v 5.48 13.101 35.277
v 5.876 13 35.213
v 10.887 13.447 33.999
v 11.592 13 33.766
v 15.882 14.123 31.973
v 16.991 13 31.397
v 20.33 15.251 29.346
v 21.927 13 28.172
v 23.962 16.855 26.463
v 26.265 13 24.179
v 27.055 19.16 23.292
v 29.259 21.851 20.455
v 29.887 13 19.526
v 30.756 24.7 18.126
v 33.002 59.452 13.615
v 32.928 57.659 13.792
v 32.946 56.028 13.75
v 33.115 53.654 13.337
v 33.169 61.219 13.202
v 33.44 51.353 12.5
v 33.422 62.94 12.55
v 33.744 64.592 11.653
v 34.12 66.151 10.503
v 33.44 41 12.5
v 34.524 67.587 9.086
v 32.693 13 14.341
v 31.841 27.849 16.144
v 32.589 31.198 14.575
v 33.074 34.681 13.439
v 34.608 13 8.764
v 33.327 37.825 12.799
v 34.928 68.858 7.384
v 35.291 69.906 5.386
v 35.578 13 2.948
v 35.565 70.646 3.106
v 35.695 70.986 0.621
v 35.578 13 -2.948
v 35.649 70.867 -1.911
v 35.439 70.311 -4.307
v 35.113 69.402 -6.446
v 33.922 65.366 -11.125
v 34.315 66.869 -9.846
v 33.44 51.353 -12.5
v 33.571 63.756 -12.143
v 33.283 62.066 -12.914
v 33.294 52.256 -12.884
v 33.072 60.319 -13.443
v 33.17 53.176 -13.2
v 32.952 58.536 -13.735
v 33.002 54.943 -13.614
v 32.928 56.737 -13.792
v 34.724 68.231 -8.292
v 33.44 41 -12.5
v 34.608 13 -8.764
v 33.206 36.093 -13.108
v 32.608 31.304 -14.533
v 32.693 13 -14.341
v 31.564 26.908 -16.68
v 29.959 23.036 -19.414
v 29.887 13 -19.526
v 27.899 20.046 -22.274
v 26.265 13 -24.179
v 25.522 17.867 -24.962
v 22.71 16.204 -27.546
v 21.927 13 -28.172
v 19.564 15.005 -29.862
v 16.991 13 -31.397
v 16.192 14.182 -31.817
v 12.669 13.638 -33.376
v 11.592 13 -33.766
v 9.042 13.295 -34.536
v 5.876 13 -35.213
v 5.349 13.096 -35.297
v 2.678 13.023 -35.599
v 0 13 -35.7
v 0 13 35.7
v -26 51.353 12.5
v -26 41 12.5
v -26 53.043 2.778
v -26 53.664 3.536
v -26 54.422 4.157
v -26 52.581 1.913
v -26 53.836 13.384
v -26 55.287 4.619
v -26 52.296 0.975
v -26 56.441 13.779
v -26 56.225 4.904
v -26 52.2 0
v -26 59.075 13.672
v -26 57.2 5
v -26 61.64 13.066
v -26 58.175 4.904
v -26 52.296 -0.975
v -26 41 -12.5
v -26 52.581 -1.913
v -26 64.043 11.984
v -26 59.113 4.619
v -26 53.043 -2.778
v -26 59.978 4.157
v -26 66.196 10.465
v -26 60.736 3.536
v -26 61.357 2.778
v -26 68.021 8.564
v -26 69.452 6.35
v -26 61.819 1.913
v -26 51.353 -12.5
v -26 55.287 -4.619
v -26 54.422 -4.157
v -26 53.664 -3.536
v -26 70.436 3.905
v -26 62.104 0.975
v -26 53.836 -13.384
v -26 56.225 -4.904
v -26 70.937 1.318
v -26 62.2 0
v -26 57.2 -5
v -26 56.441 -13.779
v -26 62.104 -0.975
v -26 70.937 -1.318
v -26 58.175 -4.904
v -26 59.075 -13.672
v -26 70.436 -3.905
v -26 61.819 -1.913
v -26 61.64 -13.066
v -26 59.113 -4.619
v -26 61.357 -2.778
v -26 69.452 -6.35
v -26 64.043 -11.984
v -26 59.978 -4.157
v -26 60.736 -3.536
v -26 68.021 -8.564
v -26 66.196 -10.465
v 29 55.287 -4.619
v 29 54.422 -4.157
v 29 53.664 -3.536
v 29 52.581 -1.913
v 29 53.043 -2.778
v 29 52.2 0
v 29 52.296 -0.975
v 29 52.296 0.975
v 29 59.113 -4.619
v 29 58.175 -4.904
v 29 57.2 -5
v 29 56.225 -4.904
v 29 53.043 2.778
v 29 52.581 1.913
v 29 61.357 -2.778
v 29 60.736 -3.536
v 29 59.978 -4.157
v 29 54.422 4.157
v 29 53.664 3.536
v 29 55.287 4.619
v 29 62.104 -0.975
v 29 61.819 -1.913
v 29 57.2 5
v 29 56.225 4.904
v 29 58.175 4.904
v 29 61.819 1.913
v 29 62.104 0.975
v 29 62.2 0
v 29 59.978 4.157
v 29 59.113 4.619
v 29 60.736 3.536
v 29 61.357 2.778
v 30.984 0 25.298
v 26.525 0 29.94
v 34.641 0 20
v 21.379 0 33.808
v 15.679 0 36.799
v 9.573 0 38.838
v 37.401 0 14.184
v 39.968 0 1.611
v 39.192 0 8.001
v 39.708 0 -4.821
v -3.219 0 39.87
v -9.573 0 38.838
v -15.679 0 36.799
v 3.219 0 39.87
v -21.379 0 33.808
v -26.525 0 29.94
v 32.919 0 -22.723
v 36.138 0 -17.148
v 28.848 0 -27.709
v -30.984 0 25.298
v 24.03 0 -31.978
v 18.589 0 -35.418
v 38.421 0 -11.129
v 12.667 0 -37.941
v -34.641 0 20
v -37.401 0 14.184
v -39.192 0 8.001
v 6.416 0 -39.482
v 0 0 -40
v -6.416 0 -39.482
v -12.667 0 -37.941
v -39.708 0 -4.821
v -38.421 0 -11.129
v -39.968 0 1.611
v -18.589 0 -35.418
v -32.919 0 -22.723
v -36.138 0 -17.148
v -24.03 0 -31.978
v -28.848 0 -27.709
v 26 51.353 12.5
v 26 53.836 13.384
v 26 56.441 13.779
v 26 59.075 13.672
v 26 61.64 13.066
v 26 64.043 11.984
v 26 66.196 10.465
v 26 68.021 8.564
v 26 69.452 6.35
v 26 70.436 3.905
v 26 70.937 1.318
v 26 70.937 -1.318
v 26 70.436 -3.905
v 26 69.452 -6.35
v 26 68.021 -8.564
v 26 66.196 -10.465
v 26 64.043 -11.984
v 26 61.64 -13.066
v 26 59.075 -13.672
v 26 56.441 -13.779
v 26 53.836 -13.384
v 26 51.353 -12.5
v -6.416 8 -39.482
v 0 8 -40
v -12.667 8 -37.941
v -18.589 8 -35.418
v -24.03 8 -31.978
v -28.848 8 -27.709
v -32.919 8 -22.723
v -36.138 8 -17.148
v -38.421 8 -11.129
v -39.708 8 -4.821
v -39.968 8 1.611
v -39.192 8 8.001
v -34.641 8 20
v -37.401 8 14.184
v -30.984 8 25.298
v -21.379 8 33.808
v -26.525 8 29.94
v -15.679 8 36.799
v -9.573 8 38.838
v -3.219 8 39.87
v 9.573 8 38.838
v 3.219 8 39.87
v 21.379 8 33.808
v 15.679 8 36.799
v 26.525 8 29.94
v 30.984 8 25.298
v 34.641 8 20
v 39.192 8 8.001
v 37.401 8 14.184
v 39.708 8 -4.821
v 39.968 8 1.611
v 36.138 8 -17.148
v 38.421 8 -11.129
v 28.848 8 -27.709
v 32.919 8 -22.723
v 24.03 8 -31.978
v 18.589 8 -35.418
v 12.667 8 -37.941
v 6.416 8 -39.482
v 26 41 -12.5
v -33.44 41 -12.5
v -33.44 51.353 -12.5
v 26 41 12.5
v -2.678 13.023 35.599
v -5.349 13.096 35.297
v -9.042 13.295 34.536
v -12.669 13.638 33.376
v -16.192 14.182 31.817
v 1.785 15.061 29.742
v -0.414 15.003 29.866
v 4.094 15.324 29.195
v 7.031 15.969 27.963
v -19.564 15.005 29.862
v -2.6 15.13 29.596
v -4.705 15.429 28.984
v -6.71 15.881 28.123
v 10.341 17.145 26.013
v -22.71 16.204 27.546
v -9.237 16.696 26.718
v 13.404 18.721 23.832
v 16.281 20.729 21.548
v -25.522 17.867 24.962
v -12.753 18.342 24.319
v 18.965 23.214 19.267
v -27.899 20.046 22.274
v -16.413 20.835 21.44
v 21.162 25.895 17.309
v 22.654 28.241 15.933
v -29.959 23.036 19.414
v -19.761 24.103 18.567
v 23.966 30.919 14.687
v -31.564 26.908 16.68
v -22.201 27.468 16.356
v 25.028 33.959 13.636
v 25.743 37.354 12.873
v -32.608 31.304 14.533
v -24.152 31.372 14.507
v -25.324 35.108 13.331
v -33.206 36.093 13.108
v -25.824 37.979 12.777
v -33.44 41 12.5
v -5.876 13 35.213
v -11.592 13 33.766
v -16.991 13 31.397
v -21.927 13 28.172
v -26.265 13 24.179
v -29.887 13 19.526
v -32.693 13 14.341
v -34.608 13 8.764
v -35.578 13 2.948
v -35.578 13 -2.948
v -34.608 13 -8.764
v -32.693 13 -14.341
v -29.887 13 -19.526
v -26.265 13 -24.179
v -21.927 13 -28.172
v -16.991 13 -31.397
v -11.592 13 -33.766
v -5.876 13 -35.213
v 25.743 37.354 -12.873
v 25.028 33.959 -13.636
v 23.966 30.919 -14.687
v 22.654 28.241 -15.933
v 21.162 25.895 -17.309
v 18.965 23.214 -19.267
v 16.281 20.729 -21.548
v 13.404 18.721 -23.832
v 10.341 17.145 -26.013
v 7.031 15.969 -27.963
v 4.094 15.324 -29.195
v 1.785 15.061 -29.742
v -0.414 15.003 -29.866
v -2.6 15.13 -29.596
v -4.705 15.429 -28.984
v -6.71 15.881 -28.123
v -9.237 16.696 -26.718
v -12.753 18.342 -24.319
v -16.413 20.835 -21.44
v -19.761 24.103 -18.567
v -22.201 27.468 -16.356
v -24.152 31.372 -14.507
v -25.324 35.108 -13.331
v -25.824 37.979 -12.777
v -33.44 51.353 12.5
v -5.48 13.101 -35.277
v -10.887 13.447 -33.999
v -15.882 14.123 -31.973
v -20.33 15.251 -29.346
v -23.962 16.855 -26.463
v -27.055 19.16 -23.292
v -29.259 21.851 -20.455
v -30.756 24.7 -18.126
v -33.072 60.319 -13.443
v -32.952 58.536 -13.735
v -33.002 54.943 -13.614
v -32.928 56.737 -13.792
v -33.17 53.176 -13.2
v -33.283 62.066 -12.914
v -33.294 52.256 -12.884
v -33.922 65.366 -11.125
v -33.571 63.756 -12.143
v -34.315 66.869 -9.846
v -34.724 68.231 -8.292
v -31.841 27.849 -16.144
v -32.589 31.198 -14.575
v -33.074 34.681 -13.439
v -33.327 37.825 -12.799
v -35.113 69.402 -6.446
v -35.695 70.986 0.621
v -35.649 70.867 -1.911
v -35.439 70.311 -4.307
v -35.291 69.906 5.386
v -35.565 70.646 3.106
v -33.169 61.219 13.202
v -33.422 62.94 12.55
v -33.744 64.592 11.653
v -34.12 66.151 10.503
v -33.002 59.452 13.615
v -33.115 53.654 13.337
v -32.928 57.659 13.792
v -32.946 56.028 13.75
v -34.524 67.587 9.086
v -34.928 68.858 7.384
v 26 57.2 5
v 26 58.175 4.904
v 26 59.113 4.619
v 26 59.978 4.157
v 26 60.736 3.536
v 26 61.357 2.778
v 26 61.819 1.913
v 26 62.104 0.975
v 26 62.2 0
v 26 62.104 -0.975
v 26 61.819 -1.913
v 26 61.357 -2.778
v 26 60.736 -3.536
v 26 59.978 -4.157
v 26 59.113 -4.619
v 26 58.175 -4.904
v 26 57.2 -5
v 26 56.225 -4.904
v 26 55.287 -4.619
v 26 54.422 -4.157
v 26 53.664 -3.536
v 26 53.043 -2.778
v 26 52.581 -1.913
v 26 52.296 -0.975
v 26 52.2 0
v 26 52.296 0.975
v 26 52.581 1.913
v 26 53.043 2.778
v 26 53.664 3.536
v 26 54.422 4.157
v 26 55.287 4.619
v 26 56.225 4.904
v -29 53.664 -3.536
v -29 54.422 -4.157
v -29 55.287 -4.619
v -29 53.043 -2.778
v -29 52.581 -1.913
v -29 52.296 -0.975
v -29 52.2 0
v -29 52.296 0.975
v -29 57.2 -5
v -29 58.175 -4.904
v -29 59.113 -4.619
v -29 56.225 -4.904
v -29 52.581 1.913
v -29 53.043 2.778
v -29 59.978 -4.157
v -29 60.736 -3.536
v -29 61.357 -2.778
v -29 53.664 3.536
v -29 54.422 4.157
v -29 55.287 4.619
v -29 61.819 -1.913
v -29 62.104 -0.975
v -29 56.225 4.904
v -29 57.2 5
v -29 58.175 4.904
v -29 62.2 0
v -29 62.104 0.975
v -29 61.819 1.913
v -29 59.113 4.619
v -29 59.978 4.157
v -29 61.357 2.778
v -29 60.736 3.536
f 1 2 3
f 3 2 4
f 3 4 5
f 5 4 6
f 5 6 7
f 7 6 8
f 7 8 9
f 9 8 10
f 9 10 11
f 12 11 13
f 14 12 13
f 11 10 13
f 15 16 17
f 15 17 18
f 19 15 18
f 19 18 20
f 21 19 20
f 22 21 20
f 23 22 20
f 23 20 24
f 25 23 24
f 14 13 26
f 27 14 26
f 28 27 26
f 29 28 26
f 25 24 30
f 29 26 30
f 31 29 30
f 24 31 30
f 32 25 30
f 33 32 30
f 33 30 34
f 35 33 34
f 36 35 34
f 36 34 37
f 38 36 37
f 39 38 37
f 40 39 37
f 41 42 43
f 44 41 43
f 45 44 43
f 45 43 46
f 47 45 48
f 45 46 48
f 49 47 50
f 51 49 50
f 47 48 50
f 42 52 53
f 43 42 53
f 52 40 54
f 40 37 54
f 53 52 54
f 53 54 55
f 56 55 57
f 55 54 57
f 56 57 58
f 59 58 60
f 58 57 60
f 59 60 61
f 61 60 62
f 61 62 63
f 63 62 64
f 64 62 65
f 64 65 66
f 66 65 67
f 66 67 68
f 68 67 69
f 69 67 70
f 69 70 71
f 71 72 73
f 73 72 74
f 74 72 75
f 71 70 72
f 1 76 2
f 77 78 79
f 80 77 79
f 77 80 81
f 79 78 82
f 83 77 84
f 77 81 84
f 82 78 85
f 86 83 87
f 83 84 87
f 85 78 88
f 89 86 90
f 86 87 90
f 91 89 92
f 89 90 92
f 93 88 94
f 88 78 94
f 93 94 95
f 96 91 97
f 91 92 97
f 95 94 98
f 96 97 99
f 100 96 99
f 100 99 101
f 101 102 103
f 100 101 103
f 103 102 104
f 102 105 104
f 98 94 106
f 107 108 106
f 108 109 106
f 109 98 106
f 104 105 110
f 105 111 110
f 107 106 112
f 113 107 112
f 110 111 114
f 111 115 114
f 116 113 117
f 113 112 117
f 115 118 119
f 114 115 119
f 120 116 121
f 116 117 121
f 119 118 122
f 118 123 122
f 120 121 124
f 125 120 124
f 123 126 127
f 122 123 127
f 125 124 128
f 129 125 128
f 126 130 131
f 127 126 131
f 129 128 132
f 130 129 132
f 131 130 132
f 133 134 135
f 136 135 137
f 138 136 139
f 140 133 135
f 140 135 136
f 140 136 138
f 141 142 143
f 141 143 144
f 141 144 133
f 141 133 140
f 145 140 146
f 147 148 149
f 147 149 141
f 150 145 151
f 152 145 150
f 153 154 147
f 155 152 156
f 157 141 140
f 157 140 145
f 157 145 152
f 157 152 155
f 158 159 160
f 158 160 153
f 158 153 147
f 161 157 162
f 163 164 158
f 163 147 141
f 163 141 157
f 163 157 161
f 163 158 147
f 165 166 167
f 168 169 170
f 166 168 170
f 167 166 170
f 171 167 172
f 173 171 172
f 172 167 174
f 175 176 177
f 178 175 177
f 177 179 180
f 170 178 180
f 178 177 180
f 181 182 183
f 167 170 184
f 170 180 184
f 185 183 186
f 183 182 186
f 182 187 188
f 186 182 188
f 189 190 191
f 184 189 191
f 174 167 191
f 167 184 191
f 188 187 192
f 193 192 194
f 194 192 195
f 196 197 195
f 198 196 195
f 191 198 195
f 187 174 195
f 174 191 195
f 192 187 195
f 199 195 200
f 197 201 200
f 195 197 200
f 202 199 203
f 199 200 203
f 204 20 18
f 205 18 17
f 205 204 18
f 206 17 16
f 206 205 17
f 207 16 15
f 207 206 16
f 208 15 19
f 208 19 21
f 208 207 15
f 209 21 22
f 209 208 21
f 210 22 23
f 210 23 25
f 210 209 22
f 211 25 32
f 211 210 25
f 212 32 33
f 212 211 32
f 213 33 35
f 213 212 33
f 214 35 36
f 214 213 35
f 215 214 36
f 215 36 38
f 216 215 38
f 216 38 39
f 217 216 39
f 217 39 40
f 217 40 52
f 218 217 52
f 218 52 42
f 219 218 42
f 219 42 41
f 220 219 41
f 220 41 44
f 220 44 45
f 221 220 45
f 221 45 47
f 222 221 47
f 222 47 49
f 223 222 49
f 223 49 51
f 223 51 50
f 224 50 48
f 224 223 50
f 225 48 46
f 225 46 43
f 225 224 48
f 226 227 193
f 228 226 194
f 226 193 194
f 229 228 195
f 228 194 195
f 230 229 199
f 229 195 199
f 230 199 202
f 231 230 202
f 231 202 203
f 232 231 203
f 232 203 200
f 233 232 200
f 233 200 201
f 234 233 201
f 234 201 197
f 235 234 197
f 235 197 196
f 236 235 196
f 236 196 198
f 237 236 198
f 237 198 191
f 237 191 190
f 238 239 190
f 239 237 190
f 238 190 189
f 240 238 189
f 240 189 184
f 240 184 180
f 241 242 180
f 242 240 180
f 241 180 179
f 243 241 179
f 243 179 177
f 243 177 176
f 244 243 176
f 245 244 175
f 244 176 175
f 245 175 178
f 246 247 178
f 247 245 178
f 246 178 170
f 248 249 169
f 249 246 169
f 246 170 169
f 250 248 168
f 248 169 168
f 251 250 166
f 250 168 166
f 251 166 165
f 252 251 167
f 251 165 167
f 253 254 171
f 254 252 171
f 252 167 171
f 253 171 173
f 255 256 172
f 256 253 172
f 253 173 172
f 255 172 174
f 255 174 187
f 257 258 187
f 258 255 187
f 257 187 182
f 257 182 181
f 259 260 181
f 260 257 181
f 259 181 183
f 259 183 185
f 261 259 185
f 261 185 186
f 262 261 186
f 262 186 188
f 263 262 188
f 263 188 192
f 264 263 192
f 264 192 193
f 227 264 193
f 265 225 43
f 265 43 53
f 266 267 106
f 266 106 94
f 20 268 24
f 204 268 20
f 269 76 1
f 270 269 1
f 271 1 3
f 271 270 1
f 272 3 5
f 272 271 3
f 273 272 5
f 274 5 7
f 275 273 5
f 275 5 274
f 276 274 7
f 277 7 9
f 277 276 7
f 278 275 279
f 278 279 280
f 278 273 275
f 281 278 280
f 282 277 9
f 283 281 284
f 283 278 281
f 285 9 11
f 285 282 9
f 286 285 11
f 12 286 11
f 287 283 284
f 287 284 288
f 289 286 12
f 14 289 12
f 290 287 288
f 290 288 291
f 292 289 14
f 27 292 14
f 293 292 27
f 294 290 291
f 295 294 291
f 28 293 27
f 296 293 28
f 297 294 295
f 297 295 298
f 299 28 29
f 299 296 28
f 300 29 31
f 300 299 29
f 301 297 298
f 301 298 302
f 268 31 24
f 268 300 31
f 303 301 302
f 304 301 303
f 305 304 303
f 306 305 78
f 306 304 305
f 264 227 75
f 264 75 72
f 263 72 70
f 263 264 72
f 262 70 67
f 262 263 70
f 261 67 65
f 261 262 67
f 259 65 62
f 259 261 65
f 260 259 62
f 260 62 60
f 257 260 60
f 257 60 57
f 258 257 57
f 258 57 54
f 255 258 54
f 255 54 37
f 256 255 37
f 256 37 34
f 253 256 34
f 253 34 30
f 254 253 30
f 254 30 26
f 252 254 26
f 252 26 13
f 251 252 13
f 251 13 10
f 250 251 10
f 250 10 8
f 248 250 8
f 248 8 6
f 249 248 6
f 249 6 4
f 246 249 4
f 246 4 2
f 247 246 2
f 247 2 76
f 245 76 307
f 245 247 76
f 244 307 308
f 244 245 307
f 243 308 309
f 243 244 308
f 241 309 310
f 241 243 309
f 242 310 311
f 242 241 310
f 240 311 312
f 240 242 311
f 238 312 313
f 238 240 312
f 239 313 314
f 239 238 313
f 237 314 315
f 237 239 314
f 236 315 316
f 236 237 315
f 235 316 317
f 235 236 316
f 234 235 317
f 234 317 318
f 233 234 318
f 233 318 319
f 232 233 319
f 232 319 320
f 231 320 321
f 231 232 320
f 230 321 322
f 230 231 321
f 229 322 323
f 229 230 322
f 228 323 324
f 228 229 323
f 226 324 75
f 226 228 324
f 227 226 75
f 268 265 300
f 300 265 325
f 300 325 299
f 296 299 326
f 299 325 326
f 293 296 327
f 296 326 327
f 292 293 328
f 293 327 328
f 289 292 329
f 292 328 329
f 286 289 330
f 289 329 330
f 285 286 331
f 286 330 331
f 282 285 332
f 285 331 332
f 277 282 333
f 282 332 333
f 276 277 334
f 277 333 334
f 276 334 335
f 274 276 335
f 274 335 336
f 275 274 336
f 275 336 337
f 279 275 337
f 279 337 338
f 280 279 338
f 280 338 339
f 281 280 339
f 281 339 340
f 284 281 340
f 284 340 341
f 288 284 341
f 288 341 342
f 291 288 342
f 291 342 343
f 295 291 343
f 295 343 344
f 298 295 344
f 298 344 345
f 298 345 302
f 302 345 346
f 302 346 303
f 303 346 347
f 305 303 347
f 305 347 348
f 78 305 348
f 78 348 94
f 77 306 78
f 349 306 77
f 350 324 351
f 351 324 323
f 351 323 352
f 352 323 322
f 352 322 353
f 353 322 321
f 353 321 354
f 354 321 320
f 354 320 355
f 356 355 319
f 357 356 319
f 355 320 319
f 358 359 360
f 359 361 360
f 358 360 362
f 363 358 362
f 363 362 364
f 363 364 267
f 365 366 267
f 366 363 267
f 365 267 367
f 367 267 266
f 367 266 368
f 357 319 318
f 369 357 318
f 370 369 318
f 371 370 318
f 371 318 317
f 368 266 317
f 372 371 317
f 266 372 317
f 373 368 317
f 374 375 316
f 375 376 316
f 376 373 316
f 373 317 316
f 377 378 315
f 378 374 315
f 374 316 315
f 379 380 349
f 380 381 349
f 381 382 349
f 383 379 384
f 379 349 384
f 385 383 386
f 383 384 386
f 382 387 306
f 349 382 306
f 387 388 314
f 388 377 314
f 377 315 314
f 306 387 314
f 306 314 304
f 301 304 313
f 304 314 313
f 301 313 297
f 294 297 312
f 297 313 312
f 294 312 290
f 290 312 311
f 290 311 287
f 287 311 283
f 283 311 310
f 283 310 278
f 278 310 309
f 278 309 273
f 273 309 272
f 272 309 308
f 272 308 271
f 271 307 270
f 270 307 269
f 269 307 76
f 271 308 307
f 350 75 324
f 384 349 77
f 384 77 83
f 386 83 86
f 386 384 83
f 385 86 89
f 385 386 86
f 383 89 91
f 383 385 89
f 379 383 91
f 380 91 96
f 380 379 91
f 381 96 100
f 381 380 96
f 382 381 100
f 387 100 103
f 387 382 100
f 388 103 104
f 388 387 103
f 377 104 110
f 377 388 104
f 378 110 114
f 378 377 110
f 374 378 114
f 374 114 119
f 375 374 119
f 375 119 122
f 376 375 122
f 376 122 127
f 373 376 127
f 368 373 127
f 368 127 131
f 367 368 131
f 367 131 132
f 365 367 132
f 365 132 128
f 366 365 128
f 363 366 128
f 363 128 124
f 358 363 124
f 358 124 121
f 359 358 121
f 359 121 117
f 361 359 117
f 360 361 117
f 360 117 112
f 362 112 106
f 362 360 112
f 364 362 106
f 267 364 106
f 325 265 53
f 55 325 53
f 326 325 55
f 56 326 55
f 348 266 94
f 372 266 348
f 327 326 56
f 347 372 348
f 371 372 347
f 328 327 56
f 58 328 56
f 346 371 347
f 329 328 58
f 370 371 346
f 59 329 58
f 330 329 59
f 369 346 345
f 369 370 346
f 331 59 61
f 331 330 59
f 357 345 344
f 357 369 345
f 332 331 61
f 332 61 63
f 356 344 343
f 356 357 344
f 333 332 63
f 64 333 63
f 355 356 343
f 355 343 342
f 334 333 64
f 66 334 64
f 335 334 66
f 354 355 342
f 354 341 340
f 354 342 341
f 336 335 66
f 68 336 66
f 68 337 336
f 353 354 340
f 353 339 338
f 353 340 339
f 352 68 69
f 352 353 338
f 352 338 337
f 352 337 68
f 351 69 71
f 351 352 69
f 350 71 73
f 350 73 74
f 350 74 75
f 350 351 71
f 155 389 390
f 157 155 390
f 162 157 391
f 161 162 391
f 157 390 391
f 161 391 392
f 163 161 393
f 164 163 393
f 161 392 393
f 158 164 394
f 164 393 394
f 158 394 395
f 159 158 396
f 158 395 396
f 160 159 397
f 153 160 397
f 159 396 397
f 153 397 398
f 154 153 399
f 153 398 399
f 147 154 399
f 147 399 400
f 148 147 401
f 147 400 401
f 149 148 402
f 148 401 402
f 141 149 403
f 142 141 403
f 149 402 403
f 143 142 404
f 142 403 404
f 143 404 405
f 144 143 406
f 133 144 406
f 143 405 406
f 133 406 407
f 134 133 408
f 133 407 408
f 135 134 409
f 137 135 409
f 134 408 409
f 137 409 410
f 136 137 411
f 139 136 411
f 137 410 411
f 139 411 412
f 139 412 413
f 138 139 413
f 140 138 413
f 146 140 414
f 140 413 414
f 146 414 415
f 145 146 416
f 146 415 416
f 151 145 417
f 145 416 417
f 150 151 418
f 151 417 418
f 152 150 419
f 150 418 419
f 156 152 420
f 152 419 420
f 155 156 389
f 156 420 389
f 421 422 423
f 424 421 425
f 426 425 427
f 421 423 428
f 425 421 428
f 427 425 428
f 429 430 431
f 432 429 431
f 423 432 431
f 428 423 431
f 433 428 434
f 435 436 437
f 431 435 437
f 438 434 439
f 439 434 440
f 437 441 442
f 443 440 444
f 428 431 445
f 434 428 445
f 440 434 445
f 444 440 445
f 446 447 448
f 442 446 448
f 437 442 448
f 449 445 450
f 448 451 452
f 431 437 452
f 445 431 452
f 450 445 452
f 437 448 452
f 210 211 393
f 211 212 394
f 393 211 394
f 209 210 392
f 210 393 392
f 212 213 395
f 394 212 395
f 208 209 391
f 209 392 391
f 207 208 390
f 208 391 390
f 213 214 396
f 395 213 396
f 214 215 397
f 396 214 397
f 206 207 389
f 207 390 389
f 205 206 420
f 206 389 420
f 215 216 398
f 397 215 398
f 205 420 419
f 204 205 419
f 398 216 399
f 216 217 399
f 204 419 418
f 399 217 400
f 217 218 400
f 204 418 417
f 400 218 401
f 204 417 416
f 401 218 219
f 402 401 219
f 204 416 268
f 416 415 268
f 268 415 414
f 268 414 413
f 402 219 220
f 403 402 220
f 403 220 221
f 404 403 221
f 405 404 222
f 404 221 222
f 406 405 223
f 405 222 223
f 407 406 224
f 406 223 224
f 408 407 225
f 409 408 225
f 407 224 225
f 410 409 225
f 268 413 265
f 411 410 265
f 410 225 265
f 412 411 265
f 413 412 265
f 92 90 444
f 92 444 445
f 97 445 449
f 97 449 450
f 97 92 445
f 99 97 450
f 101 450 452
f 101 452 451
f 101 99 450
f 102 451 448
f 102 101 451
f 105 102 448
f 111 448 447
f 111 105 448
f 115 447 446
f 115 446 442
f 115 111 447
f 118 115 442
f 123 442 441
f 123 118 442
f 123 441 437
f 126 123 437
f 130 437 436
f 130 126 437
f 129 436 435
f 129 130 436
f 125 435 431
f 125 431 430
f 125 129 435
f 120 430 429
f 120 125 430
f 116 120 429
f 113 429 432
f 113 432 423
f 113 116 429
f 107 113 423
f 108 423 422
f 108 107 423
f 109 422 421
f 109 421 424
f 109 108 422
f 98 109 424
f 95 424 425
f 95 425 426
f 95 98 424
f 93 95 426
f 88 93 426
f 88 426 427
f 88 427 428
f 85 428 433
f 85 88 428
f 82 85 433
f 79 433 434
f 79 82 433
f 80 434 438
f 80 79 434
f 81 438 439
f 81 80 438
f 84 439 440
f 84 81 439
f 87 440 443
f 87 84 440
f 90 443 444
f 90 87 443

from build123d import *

# Parameters (mm, degrees)
SKETCH_1_R               = 40
EXTRUDE_1_DEPTH          = 13
SKETCH_3_R               = 35.7
EXTRUDE_2_DEPTH          = 58
CUT_EXTRUDE_1_DEPTH      = 58
CUT_EXTRUDE_1_DEPTH_BACK = 58
CUT_EXTRUDE_2_DEPTH      = 58
CUT_EXTRUDE_2_DEPTH_BACK = 58
SKETCH_6_R               = 5
CUT_EXTRUDE_3_DEPTH      = 3


with BuildPart() as part:
    # 草图1 → 凸台-拉伸1 (new body)
    with BuildSketch(Plane(origin=(0, 0, 0), x_dir=(1, 0, 0), z_dir=(0, 1, 0))):
        Circle(SKETCH_1_R)
    extrude(amount=EXTRUDE_1_DEPTH)

    # 草图2 → 切除-旋转1 (revolve, cut)
    with BuildSketch(Plane.XY):
        Polygon((-35.7, 13), (-40, 8), (-40, 13), align=None)
    revolve(axis=Axis((0, 13, 0), (0, -1, 0)), mode=Mode.SUBTRACT)

    # 草图3 → 凸台-拉伸2 (add)
    with BuildSketch(Plane(origin=(0, 13, 0), x_dir=(1, 0, 0), z_dir=(0, 1, 0))):
        Circle(SKETCH_3_R)
    extrude(amount=EXTRUDE_2_DEPTH)

    # 草图4 → 切除-拉伸1 (cut, two sides: drawn at the far end of the back side and taken through both)
    with BuildSketch(Plane(origin=(0, 0, 0), x_dir=(0, 0, -1), z_dir=(1, 0, 0)).offset(-CUT_EXTRUDE_1_DEPTH_BACK)):
        with BuildLine():
            ThreePointArc((-35.7, 13), (-19.374333005, 23.084447347), (-12.5, 41))
            Line((-12.5, 41), (-12.5, 51.352778438))
            ThreePointArc((-12.5, 51.352778438), (-11.643273972, 64.607710255), (0, 71))
            Line((0, 71), (-35.7, 71))
            Line((-35.7, 71), (-35.7, 13))
        make_face()
        with BuildLine():
            Line((35.7, 71), (0, 71))
            ThreePointArc((0, 71), (11.643273972, 64.607710255), (12.5, 51.352778438))
            Line((12.5, 51.352778438), (12.5, 41))
            ThreePointArc((12.5, 41), (19.374333005, 23.084447347), (35.7, 13))
            Line((35.7, 13), (35.7, 71))
        make_face()
    extrude(amount=CUT_EXTRUDE_1_DEPTH + CUT_EXTRUDE_1_DEPTH_BACK, mode=Mode.SUBTRACT)

    # 草图5 → 切除-拉伸2 (cut, two sides: drawn at the far end of the back side and taken through both)
    with BuildSketch(Plane.XY.offset(-CUT_EXTRUDE_2_DEPTH_BACK)):
        with BuildLine():
            Line((-26, 71), (-26, 41))
            ThreePointArc((-26, 41), (0, 15), (26, 41))
            Line((26, 41), (26, 71))
            Line((26, 71), (-26, 71))
        make_face()
    extrude(amount=CUT_EXTRUDE_2_DEPTH + CUT_EXTRUDE_2_DEPTH_BACK, mode=Mode.SUBTRACT)

    # 草图6 → 切除-拉伸3 (cut)
    with BuildSketch(Plane.ZY.offset(-26)):
        with Locations((0, 57.2)):
            Circle(SKETCH_6_R)
    cut_extrude_3 = extrude(amount=-CUT_EXTRUDE_3_DEPTH, mode=Mode.SUBTRACT)

    # 镜向1: 切除-拉伸3 across plane
    add(cut_extrude_3.mirror(Plane(origin=(0, 0, 0), x_dir=(0, 0, 1), z_dir=(1, 0, 0))), mode=Mode.SUBTRACT)


solid = part.part
